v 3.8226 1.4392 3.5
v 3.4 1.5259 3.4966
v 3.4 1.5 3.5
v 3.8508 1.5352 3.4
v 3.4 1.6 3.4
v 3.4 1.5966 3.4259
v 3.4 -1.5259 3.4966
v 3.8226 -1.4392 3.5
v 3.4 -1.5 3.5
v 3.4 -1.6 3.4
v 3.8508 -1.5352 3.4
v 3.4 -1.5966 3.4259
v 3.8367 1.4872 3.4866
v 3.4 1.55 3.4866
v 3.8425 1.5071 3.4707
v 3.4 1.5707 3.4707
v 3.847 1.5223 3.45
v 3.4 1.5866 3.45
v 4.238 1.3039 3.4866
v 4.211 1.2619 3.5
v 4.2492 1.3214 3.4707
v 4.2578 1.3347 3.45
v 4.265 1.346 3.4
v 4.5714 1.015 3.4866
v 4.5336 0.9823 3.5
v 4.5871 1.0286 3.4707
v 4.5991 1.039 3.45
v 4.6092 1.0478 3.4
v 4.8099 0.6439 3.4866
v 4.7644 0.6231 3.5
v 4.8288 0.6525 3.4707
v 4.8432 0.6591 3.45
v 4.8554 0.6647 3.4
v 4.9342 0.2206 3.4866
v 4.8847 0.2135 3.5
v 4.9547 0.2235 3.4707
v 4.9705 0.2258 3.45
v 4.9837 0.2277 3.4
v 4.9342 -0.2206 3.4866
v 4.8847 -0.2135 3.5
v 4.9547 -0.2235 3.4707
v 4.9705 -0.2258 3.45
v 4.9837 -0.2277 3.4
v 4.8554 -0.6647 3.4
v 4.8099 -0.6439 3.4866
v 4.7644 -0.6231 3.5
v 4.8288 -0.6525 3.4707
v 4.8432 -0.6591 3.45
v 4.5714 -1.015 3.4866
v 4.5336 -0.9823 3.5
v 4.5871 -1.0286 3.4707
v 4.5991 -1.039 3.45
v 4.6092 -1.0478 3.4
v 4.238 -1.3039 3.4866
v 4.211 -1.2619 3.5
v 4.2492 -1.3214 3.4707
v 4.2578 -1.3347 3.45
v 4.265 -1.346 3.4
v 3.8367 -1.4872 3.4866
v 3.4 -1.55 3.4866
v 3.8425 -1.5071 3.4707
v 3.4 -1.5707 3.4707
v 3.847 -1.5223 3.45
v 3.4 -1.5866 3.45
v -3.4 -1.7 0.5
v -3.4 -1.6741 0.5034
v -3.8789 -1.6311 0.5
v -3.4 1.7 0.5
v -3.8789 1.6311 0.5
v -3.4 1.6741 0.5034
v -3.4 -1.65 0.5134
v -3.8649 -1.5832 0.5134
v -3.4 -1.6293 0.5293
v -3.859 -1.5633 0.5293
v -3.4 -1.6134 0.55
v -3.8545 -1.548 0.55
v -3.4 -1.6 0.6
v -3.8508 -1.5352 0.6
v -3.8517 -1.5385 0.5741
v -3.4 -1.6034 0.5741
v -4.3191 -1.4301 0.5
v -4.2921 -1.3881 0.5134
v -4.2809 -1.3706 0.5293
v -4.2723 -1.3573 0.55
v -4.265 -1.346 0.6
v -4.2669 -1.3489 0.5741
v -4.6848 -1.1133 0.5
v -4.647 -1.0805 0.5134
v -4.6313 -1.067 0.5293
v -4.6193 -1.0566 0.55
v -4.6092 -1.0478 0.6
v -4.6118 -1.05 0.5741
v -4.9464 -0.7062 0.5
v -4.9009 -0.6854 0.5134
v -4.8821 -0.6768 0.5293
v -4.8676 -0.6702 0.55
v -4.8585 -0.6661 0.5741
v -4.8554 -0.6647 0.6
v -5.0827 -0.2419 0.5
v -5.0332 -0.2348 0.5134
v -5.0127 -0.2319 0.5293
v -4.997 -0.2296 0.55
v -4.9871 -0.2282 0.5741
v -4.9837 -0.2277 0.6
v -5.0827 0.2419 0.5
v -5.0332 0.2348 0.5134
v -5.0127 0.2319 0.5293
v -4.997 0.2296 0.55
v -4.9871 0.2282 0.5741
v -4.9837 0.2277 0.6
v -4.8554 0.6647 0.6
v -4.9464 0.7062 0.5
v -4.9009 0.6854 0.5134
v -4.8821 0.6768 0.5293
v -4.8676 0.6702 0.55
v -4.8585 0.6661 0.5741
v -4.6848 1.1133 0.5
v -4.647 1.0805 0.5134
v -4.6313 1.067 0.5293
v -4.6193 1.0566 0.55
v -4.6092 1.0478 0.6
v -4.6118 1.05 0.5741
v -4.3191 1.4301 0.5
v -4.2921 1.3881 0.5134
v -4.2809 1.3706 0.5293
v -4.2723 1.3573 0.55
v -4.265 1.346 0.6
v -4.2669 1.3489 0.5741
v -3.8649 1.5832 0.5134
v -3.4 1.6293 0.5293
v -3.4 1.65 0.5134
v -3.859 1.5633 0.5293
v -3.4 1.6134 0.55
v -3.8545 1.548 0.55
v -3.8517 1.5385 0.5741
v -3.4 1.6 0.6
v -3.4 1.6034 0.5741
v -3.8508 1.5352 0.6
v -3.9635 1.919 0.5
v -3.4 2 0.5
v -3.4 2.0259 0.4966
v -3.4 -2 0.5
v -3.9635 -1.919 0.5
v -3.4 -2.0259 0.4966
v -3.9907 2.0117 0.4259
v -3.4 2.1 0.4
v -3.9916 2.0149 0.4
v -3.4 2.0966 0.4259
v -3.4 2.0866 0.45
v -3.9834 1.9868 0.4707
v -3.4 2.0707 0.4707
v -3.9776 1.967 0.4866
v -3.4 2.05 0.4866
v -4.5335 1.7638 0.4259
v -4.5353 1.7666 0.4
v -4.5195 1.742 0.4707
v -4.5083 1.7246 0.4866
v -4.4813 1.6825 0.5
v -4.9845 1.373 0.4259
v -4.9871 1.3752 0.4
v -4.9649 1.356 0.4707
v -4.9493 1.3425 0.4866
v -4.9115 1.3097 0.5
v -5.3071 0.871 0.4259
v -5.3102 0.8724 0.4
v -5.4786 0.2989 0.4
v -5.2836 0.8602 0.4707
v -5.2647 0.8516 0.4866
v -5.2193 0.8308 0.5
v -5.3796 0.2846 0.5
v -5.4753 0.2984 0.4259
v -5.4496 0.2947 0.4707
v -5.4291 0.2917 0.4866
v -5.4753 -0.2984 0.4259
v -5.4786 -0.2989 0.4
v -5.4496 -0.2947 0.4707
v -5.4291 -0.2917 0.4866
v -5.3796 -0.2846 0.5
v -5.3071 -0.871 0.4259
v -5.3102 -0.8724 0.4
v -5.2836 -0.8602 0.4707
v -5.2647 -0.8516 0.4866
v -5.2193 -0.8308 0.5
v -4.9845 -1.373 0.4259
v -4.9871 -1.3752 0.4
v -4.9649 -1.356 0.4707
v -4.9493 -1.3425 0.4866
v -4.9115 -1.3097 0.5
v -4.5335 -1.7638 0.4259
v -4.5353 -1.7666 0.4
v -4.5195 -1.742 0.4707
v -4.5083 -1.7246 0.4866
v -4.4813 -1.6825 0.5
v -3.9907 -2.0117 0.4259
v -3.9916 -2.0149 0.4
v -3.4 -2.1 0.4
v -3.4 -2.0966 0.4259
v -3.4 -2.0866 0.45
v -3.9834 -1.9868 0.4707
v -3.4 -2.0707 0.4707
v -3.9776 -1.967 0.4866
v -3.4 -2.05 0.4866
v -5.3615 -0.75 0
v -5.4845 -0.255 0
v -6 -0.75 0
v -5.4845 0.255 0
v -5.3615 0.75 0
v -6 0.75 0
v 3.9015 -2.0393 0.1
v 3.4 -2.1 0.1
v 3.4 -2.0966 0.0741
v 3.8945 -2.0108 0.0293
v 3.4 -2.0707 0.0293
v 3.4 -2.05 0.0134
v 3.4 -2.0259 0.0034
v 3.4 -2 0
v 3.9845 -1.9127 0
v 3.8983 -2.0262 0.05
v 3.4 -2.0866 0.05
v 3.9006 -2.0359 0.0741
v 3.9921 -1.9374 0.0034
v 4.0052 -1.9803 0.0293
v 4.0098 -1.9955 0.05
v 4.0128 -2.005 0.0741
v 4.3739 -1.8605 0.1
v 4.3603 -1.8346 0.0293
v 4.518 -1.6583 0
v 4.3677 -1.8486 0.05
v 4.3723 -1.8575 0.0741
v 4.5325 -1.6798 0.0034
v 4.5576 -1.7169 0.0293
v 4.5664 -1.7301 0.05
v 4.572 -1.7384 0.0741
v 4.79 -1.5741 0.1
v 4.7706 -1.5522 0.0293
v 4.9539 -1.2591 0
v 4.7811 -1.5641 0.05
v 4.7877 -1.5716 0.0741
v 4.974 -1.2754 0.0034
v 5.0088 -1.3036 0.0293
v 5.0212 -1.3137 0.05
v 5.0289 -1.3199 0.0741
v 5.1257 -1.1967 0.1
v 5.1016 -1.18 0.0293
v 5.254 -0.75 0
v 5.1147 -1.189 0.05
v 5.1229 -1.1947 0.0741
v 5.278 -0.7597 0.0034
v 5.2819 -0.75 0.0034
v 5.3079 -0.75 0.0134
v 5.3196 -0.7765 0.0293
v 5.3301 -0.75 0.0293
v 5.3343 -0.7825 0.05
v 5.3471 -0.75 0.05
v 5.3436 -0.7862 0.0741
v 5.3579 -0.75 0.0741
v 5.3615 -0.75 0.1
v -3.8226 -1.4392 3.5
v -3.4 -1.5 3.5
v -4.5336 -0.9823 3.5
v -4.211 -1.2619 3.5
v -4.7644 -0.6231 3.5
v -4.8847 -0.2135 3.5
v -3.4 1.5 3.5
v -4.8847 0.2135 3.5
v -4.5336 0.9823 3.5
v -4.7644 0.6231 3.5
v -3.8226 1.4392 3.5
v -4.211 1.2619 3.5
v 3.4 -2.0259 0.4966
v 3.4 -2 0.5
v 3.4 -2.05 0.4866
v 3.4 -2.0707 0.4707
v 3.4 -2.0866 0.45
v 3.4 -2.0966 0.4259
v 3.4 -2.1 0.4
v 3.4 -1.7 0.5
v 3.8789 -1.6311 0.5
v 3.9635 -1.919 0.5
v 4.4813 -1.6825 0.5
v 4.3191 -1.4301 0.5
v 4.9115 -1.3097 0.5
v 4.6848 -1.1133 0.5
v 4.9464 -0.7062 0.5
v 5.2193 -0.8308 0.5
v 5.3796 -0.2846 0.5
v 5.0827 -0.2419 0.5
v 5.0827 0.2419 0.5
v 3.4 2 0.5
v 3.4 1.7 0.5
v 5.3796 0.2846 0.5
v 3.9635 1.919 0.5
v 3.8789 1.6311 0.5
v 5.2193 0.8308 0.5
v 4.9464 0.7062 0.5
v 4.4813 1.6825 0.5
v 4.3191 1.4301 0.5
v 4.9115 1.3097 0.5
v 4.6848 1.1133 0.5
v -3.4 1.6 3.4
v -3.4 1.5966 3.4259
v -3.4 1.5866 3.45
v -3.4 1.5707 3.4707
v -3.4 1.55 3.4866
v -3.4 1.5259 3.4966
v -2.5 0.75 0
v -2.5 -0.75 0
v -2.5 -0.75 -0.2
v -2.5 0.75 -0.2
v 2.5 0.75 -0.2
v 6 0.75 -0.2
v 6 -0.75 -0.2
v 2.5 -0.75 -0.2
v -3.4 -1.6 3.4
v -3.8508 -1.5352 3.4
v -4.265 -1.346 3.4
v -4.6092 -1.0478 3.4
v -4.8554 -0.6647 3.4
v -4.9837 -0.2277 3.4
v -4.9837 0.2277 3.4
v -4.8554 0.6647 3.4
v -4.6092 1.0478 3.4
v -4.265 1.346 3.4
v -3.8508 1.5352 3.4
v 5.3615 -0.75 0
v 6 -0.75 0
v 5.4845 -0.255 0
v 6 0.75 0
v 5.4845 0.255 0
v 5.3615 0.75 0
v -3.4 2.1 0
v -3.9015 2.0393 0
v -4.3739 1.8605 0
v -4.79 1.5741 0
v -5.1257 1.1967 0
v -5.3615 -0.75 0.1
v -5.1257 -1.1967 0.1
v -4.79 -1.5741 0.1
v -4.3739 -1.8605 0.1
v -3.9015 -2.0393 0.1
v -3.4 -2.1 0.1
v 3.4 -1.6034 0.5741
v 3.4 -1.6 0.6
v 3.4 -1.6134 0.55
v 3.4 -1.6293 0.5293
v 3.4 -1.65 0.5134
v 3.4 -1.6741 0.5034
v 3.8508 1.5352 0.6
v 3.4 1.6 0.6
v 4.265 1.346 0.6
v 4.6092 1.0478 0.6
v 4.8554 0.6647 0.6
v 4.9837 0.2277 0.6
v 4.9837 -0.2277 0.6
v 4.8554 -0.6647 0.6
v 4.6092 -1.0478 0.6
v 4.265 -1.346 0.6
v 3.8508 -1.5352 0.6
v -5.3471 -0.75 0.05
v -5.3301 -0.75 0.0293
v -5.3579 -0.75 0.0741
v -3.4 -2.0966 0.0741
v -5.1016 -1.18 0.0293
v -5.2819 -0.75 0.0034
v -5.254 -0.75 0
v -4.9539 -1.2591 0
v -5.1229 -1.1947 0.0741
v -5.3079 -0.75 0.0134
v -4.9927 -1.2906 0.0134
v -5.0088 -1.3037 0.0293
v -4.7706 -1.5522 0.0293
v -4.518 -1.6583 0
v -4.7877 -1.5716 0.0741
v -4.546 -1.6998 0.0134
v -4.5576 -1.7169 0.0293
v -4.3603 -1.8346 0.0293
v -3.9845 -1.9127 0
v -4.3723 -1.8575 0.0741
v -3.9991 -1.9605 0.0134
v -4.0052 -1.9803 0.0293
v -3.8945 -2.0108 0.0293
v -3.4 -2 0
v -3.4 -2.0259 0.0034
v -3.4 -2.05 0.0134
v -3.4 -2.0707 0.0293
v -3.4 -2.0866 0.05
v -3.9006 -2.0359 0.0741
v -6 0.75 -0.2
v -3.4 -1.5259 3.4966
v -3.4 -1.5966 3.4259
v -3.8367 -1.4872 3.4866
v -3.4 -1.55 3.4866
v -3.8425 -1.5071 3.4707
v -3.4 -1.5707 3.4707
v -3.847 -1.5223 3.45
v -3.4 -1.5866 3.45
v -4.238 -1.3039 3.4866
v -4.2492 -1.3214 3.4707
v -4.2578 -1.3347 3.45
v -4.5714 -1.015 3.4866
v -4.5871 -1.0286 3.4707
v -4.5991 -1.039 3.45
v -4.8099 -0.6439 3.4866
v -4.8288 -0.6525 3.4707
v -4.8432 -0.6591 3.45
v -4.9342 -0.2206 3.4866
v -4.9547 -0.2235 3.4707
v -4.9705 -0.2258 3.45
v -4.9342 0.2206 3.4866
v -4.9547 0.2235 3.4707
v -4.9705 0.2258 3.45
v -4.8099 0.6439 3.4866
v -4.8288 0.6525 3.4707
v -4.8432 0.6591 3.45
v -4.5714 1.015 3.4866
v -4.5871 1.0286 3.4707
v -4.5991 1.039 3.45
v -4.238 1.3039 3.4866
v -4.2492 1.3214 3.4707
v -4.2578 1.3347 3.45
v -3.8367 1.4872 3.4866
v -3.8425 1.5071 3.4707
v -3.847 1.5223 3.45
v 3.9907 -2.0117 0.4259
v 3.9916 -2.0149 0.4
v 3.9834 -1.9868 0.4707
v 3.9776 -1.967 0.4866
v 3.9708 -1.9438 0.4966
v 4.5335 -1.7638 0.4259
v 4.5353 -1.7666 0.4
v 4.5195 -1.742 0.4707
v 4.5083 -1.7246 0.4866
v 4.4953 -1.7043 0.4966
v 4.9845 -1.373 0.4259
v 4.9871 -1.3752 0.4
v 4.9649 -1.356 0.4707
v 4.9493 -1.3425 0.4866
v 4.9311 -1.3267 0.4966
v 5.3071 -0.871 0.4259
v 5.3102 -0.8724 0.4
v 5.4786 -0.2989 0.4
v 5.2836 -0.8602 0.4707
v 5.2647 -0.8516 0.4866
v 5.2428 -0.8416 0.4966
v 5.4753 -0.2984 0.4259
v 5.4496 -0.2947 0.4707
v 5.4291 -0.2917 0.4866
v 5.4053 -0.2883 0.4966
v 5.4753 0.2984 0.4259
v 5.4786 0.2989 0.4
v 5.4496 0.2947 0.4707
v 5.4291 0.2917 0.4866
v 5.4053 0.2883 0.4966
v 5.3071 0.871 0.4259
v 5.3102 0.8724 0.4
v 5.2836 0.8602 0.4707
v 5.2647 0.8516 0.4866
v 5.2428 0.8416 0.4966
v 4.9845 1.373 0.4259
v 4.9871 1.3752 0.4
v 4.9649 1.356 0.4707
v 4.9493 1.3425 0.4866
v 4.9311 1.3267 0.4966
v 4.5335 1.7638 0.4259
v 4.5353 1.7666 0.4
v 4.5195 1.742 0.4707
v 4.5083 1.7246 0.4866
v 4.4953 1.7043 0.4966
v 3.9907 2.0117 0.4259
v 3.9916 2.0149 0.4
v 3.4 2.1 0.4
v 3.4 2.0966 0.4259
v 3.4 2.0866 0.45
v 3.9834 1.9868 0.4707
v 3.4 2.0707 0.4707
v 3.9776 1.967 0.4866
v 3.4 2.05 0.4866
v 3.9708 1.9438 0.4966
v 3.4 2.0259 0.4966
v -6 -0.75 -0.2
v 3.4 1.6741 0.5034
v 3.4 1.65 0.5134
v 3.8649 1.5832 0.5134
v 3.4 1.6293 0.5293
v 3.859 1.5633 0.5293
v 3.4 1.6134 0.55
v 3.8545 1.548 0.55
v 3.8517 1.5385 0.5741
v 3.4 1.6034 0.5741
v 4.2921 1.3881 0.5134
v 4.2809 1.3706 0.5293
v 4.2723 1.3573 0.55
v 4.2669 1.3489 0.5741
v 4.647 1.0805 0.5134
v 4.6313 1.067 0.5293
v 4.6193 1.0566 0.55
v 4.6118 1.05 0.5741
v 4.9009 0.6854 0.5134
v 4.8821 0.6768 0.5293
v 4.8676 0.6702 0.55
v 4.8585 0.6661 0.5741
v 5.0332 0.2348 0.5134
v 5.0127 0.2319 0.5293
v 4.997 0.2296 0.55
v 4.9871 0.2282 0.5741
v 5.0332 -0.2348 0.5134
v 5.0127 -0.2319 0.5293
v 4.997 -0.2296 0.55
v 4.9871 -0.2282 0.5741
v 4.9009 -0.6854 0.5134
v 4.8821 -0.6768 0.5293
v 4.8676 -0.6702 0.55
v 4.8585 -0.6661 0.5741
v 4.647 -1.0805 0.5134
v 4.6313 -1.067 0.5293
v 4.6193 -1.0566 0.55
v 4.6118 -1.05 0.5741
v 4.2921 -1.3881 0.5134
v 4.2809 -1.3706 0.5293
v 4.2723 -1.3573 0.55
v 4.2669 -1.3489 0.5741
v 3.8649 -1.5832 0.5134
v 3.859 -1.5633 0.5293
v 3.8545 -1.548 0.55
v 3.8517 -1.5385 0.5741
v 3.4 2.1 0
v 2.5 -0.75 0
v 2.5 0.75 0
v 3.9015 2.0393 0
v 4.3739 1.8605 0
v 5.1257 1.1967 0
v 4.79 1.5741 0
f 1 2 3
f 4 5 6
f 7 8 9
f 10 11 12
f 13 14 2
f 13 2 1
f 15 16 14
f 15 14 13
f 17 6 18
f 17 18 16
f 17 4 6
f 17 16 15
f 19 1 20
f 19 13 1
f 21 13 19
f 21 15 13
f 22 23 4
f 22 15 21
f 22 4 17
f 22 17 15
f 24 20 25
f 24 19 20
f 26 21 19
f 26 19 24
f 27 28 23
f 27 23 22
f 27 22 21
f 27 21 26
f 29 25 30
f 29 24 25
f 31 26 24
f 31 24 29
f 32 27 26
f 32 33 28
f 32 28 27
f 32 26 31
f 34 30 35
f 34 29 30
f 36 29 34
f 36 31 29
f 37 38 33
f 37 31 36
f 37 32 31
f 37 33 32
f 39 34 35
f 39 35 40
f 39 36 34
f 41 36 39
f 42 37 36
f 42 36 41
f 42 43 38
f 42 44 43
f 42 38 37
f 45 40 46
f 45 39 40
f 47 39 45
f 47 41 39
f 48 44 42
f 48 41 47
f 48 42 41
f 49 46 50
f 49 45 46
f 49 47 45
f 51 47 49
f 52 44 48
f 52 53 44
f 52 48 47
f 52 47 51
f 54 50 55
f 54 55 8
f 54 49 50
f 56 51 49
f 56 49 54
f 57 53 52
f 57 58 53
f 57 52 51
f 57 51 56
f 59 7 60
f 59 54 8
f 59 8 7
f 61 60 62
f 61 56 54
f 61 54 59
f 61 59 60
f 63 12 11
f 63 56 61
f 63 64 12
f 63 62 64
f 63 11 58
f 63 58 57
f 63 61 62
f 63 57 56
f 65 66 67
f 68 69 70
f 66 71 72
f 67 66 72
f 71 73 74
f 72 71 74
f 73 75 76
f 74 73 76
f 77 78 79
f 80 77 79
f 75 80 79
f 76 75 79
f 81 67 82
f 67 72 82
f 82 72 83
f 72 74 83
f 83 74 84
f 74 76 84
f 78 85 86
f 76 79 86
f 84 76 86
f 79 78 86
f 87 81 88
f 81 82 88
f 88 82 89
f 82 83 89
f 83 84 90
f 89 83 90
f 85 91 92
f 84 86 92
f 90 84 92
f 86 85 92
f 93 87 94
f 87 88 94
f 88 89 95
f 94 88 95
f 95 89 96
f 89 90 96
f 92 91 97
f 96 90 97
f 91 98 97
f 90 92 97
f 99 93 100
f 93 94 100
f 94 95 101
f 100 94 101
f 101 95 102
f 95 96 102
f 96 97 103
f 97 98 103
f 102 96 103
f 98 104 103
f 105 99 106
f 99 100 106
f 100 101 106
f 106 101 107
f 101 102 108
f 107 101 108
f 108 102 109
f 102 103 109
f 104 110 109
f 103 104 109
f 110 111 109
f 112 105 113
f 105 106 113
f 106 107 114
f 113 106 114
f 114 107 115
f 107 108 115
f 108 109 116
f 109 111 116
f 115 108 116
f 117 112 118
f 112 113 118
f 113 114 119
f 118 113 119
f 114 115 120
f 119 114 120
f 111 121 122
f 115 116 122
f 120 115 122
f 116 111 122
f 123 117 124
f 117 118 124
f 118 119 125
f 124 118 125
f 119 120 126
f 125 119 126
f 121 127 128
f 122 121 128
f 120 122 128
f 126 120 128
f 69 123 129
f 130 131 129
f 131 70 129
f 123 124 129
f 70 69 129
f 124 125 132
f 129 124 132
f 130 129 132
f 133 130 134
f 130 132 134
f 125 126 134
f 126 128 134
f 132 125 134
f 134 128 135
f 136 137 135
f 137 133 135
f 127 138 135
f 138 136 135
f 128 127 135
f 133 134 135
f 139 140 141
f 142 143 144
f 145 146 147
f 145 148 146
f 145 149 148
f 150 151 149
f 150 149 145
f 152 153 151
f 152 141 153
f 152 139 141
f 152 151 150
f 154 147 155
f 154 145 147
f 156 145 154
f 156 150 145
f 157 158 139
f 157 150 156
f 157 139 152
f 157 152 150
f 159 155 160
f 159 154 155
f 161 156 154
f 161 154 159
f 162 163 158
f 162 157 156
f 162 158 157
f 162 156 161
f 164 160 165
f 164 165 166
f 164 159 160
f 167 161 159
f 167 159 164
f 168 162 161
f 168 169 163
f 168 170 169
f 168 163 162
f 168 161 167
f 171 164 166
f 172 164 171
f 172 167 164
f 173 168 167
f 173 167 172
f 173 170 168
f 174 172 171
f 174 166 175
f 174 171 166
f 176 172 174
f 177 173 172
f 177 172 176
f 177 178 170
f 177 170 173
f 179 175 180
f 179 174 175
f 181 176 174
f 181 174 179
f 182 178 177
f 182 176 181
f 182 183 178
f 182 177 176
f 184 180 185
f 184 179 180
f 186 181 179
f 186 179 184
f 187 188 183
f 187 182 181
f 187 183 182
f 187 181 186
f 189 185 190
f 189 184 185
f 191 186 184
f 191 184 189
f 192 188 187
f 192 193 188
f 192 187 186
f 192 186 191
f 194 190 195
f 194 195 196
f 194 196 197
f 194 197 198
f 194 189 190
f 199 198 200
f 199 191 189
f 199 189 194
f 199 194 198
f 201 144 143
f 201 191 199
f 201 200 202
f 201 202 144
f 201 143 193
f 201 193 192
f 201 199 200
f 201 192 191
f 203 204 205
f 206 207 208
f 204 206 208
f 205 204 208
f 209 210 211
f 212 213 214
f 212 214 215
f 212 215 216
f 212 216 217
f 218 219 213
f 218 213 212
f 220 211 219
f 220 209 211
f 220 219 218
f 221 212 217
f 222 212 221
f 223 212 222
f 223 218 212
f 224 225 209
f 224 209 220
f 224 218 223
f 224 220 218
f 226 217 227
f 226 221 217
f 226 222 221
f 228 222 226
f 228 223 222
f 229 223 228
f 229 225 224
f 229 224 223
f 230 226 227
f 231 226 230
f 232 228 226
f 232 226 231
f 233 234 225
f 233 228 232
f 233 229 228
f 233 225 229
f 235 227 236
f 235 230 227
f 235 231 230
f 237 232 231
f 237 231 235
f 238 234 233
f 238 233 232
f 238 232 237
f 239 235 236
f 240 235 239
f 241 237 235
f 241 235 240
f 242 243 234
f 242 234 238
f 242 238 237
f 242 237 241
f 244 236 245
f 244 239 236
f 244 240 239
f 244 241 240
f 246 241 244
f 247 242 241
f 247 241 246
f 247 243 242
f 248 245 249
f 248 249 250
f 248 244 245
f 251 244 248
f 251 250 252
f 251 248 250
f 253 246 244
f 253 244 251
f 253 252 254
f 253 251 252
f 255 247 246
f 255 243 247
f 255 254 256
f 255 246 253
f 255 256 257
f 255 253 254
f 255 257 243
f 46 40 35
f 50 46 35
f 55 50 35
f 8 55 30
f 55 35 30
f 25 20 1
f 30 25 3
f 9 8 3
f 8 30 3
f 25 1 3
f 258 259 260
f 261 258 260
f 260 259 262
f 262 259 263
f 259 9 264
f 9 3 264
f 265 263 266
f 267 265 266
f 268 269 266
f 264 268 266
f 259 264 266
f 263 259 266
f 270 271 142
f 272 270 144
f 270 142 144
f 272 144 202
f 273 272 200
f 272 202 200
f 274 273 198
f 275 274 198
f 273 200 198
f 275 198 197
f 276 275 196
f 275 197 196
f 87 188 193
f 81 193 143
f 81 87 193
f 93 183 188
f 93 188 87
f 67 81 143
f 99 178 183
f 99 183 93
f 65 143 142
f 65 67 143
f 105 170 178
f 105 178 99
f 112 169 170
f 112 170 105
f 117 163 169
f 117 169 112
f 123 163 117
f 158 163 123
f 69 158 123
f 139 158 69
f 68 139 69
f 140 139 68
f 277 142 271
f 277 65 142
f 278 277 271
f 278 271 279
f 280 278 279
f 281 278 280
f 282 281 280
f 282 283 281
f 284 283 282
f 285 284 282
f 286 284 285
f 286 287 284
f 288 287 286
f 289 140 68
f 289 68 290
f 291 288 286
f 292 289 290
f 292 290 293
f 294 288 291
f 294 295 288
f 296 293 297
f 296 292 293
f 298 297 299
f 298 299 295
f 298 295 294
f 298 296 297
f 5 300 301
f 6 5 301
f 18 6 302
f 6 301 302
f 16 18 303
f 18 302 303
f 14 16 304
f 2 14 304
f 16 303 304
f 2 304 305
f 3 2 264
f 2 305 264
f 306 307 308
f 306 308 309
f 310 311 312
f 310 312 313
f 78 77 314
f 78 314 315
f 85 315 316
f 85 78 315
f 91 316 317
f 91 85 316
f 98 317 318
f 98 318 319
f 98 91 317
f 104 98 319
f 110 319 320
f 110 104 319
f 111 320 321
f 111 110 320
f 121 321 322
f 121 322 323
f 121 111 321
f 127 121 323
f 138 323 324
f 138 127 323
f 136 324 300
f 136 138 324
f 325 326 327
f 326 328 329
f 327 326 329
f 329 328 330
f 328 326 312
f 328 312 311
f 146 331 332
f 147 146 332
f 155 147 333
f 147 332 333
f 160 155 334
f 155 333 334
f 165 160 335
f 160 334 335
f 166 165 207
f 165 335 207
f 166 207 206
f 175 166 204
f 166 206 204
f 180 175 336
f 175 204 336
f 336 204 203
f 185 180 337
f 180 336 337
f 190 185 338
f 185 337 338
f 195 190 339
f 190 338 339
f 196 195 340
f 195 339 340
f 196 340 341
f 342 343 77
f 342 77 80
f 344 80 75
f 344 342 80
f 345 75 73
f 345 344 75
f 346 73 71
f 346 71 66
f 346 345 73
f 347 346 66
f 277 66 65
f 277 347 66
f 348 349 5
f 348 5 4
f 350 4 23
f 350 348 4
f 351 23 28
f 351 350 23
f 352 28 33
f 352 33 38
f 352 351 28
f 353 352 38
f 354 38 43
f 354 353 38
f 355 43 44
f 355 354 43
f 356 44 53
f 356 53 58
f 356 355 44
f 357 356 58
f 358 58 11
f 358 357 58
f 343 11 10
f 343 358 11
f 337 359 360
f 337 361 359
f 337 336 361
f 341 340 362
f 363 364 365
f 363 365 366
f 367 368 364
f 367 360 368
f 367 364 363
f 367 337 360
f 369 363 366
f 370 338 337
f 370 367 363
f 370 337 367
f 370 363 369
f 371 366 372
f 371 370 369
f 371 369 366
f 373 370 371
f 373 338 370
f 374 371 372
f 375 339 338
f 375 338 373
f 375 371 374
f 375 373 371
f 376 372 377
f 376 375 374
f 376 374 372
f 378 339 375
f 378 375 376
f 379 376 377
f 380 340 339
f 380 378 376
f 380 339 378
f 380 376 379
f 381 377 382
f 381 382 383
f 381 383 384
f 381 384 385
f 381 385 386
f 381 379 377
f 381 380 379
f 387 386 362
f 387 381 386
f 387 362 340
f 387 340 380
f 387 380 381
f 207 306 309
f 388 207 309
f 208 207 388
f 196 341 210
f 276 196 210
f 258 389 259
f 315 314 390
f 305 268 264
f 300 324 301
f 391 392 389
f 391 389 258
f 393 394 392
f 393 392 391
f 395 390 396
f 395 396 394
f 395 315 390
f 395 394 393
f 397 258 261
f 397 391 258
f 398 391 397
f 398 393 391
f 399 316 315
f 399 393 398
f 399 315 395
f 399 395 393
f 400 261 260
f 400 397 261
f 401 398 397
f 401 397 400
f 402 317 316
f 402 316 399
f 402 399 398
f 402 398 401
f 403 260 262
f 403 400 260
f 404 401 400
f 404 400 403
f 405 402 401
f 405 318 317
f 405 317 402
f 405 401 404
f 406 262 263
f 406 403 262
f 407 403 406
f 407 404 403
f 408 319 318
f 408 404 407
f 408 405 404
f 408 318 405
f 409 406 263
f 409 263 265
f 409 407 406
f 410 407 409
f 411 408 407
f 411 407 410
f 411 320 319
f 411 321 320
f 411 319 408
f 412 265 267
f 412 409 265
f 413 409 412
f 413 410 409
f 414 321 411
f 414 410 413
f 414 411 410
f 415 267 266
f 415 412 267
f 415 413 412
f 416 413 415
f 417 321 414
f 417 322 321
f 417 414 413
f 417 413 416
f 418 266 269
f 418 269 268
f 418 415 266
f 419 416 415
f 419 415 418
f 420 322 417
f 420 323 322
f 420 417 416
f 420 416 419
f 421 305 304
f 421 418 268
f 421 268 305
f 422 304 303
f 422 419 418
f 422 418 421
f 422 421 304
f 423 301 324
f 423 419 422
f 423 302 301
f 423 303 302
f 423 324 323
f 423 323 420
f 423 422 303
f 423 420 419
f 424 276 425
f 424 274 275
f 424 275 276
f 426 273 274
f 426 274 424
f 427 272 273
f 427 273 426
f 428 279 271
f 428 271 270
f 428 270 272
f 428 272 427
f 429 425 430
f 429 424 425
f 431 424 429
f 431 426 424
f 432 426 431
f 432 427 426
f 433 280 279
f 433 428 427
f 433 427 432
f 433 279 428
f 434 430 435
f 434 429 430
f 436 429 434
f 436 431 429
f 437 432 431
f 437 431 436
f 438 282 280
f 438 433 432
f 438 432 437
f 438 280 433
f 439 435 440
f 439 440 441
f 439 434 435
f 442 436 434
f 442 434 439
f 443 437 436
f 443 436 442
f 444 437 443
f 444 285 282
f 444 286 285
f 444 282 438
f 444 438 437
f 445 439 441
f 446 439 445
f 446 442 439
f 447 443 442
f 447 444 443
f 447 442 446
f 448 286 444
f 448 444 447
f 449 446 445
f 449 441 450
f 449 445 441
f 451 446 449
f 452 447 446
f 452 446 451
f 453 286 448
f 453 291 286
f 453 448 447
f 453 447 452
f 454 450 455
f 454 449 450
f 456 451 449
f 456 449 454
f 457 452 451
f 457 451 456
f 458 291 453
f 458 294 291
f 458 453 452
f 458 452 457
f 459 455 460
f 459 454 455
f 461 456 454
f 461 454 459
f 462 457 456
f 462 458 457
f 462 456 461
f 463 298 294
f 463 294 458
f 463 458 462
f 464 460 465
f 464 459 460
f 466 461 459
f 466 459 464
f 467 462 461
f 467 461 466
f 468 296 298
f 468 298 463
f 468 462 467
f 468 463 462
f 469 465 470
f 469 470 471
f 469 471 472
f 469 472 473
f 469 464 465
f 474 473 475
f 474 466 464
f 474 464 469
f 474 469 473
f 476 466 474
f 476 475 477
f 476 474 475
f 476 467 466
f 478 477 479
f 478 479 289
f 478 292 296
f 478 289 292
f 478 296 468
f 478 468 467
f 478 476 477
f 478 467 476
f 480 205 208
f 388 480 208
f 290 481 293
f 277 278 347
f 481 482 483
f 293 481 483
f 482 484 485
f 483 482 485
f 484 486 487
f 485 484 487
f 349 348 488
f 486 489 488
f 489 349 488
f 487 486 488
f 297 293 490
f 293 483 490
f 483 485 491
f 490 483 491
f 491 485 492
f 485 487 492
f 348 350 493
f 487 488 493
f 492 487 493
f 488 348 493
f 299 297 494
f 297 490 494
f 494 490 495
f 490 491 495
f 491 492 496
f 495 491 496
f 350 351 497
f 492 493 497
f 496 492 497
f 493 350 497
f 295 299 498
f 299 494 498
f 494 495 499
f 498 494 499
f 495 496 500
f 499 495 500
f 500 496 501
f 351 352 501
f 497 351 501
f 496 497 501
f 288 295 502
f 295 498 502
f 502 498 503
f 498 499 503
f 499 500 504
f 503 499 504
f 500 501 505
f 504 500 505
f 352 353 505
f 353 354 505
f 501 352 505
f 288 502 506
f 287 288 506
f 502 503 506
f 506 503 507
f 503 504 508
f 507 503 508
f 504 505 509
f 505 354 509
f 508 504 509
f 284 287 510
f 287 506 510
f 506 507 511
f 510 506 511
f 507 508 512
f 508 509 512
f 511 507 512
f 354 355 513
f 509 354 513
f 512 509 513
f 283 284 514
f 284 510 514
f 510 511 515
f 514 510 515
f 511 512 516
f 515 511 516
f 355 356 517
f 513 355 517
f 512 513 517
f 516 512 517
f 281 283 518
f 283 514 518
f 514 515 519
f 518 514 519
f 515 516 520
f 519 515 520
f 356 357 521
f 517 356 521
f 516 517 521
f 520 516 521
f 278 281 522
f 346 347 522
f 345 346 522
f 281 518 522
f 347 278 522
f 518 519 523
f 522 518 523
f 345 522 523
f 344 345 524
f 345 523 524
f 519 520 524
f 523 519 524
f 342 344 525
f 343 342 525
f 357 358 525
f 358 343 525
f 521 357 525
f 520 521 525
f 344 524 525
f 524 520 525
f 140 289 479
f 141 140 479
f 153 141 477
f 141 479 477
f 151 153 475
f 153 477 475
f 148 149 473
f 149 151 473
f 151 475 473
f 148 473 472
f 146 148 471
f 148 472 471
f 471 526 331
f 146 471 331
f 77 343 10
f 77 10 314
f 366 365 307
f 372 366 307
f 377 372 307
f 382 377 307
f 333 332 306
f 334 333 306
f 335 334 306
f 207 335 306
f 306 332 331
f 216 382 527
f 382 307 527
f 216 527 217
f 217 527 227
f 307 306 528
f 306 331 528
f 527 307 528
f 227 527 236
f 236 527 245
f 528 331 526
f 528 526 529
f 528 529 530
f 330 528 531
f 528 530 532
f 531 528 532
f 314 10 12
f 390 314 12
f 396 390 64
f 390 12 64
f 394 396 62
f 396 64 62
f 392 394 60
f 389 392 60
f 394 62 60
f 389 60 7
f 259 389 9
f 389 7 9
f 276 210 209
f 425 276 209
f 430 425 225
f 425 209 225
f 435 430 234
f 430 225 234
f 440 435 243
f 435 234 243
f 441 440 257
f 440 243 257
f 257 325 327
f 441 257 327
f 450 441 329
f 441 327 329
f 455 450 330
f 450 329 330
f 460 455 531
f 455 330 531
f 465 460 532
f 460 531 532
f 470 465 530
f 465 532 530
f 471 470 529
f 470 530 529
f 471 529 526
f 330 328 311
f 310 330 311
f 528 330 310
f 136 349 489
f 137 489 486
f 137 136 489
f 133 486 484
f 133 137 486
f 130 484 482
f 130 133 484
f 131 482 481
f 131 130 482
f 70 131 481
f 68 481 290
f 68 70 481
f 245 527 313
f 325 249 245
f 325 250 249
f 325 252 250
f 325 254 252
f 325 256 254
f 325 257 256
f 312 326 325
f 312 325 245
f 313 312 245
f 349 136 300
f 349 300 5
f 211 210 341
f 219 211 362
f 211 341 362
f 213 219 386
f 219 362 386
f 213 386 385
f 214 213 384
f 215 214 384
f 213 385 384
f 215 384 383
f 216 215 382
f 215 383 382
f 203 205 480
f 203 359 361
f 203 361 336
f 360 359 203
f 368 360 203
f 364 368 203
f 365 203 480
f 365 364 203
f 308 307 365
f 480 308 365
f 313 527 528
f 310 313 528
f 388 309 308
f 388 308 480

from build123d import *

# Parameters (mm, degrees)
EXTRUDE_1_DEPTH = 0.5
EXTRUDE_2_DEPTH = 3
SKETCH_3_W      = 3.5
SKETCH_3_H      = 1.5
EXTRUDE_3_DEPTH = 0.2
FILLET_1_R      = 0.1


with BuildPart() as part:
    # 草图1 → 凸台-拉伸1 (new body)
    with BuildSketch(Plane.XY):
        with BuildLine():
            Line((3.4, 2.1), (-3.4, 2.1))
            ThreePointArc((-3.4, 2.1), (-5.5, 0), (-3.4, -2.1))
            Line((-3.4, -2.1), (3.4, -2.1))
            ThreePointArc((3.4, -2.1), (5.5, 0), (3.4, 2.1))
        make_face()
    extrude(amount=EXTRUDE_1_DEPTH)

    # 草图2 → 凸台-拉伸2 (add)
    with BuildSketch(Plane.XY.offset(0.5)):
        with BuildLine():
            Line((-3.4, 1.6), (3.4, 1.6))
            ThreePointArc((3.4, 1.6), (5, 0), (3.4, -1.6))
            Line((3.4, -1.6), (-3.4, -1.6))
            ThreePointArc((-3.4, -1.6), (-5, 0), (-3.4, 1.6))
        make_face()
    extrude(amount=EXTRUDE_2_DEPTH)

    # 草图3 → 凸台-拉伸3 (add)
    with BuildSketch(Plane(origin=(0, 0, 0), x_dir=(-1, 0, 0), z_dir=(0, 0, -1))):
        with Locations((-4.25, 0)):
            Rectangle(SKETCH_3_W, SKETCH_3_H)
        with Locations((4.25, 0)):
            Rectangle(SKETCH_3_W, SKETCH_3_H)
    extrude(amount=EXTRUDE_3_DEPTH)

    # 圆角1
    # the kernel refuses this fillet: 0.1 mm, written as the material it adds along each edge
    with BuildSketch(Plane(origin=(3.4, 0, 0.5), x_dir=(0, 1, 0), z_dir=(-1, 0, 0))) as fillet_1_piece_1:
        with BuildLine():
            CenterArc((1.6 + FILLET_1_R, -FILLET_1_R), FILLET_1_R, 90, 90)
            Line((1.6, -FILLET_1_R), (1.6, 0))
            Line((1.6, 0), (1.6 + FILLET_1_R, 0))
        make_face()
    revolve(axis=Axis((3.4, 0, 0.5), (0, 0, -1)), revolution_arc=180)
    with BuildSketch(Plane(origin=(-3.4, 1.6, 0.5), x_dir=(0, 1, 0), z_dir=(1, 0, 0)), Plane(origin=(3.4, -1.6, 0.5), x_dir=(0, -1, 0), z_dir=(-1, 0, 0))) as fillet_1_piece_2:
        with BuildLine():
            CenterArc((FILLET_1_R, FILLET_1_R), FILLET_1_R, 180, 90)
            Line((0, FILLET_1_R), (0, 0))
            Line((0, 0), (FILLET_1_R, 0))
        make_face()
    extrude(amount=6.8)
    with BuildSketch(Plane(origin=(-3.4, 0, 0.5), x_dir=(0, -1, 0), z_dir=(1, 0, 0))) as fillet_1_piece_3:
        with BuildLine():
            CenterArc((1.6 + FILLET_1_R, -FILLET_1_R), FILLET_1_R, 90, 90)
            Line((1.6, -FILLET_1_R), (1.6, 0))
            Line((1.6, 0), (1.6 + FILLET_1_R, 0))
        make_face()
    revolve(axis=Axis((-3.4, 0, 0.5), (0, 0, -1)), revolution_arc=180)
    # the kernel refuses this fillet: 0.1 mm, written as the material it takes off along each edge
    with BuildSketch(Plane(origin=(-3.4, 0, 0.5), x_dir=(0, 1, 0), z_dir=(1, 0, 0))) as fillet_1_2_piece_1:
        with BuildLine():
            CenterArc((2.1 - FILLET_1_R, -FILLET_1_R), FILLET_1_R, 0, 90)
            Line((2.1 - FILLET_1_R, 0), (2.1, 0))
            Line((2.1, 0), (2.1, -FILLET_1_R))
        make_face()
    revolve(axis=Axis((-3.4, 0, 0.5), (0, 0, 1)), revolution_arc=180, mode=Mode.SUBTRACT)
    with BuildSketch(Plane(origin=(-3.4, -2.1, 0.5), x_dir=(0, 1, 0), z_dir=(1, 0, 0)), Plane(origin=(-3.4, 1.6, 3.5), x_dir=(0, 0, -1), z_dir=(1, 0, 0)), Plane(origin=(3.4, -1.6, 3.5), x_dir=(0, 0, -1), z_dir=(-1, 0, 0))) as fillet_1_2_piece_2:
        with BuildLine():
            CenterArc((FILLET_1_R, -FILLET_1_R), FILLET_1_R, 90, 90)
            Line((0, -FILLET_1_R), (0, 0))
            Line((0, 0), (FILLET_1_R, 0))
        make_face()
    extrude(amount=6.8, mode=Mode.SUBTRACT)
    with BuildSketch(Plane(origin=(3.4, 0, 3.5), x_dir=(0, 1, 0), z_dir=(-1, 0, 0))) as fillet_1_2_piece_3:
        with BuildLine():
            CenterArc((1.6 - FILLET_1_R, FILLET_1_R), FILLET_1_R, 270, 90)
            Line((1.6 - FILLET_1_R, 0), (1.6, 0))
            Line((1.6, 0), (1.6, FILLET_1_R))
        make_face()
    revolve(axis=Axis((3.4, 0, 3.5), (0, 0, -1)), revolution_arc=180, mode=Mode.SUBTRACT)
    with BuildSketch(Plane(origin=(-3.4, 0, 3.5), x_dir=(0, -1, 0), z_dir=(1, 0, 0))) as fillet_1_2_piece_4:
        with BuildLine():
            CenterArc((1.6 - FILLET_1_R, FILLET_1_R), FILLET_1_R, 270, 90)
            Line((1.6 - FILLET_1_R, 0), (1.6, 0))
            Line((1.6, 0), (1.6, FILLET_1_R))
        make_face()
    revolve(axis=Axis((-3.4, 0, 3.5), (0, 0, -1)), revolution_arc=180, mode=Mode.SUBTRACT)
    with BuildSketch(Plane(origin=(-3.4, 0, 0), x_dir=(-0.9698622672900031, -0.2436538168941636, 0), z_dir=(-0.2436538168941636, 0.9698622672900031, 0))) as fillet_1_2_piece_5_section:
        with BuildLine():
            CenterArc((2.1 - FILLET_1_R, FILLET_1_R), FILLET_1_R, 270, 90)
            Line((2.1 - FILLET_1_R, 0), (2.1, 0))
            Line((2.1, 0), (2.1, FILLET_1_R))
        make_face()
    fillet_1_2_piece_5 = revolve(axis=Axis((-3.4, 0, 0), (0, 0, 1)), revolution_arc=75.897707553, mode=Mode.PRIVATE)
    fillet_1_2_piece_5 = split(fillet_1_2_piece_5, bisect_by=Plane(origin=(-4.574684064, -0.75, 0.028052066), z_dir=(0, -1, 0)), keep=Keep.TOP, mode=Mode.PRIVATE)
    add(fillet_1_2_piece_5, mode=Mode.SUBTRACT)
    with BuildSketch(Plane(origin=(3.4, 0, 0.5), x_dir=(0, -1, 0), z_dir=(-1, 0, 0))) as fillet_1_2_piece_6:
        with BuildLine():
            CenterArc((2.1 - FILLET_1_R, -FILLET_1_R), FILLET_1_R, 0, 90)
            Line((2.1 - FILLET_1_R, 0), (2.1, 0))
            Line((2.1, 0), (2.1, -FILLET_1_R))
        make_face()
    revolve(axis=Axis((3.4, 0, 0.5), (0, 0, 1)), revolution_arc=180, mode=Mode.SUBTRACT)
    with BuildSketch(Plane(origin=(-3.4, -2.1, 0), x_dir=(0, 1, 0), z_dir=(1, 0, 0)), Plane(origin=(3.4, 2.1, 0.5), x_dir=(0, 0, -1), z_dir=(-1, 0, 0))) as fillet_1_2_piece_7:
        with BuildLine():
            CenterArc((FILLET_1_R, FILLET_1_R), FILLET_1_R, 180, 90)
            Line((0, FILLET_1_R), (0, 0))
            Line((0, 0), (FILLET_1_R, 0))
        make_face()
    extrude(amount=6.8, mode=Mode.SUBTRACT)
    with BuildSketch(Plane(origin=(3.4, 0, 0), x_dir=(0, -1, 0), z_dir=(-1, 0, 0))) as fillet_1_2_piece_8_section:
        with BuildLine():
            CenterArc((2.1 - FILLET_1_R, FILLET_1_R), FILLET_1_R, 270, 90)
            Line((2.1 - FILLET_1_R, 0), (2.1, 0))
            Line((2.1, 0), (2.1, FILLET_1_R))
        make_face()
    fillet_1_2_piece_8 = revolve(axis=Axis((3.4, 0, 0), (0, 0, 1)), revolution_arc=75.897707553, mode=Mode.PRIVATE)
    fillet_1_2_piece_8 = split(fillet_1_2_piece_8, bisect_by=Plane(origin=(4.574684074, -0.75, 0.028052047), z_dir=(0, -1, 0)), keep=Keep.TOP, mode=Mode.PRIVATE)
    add(fillet_1_2_piece_8, mode=Mode.SUBTRACT)


solid = part.part
